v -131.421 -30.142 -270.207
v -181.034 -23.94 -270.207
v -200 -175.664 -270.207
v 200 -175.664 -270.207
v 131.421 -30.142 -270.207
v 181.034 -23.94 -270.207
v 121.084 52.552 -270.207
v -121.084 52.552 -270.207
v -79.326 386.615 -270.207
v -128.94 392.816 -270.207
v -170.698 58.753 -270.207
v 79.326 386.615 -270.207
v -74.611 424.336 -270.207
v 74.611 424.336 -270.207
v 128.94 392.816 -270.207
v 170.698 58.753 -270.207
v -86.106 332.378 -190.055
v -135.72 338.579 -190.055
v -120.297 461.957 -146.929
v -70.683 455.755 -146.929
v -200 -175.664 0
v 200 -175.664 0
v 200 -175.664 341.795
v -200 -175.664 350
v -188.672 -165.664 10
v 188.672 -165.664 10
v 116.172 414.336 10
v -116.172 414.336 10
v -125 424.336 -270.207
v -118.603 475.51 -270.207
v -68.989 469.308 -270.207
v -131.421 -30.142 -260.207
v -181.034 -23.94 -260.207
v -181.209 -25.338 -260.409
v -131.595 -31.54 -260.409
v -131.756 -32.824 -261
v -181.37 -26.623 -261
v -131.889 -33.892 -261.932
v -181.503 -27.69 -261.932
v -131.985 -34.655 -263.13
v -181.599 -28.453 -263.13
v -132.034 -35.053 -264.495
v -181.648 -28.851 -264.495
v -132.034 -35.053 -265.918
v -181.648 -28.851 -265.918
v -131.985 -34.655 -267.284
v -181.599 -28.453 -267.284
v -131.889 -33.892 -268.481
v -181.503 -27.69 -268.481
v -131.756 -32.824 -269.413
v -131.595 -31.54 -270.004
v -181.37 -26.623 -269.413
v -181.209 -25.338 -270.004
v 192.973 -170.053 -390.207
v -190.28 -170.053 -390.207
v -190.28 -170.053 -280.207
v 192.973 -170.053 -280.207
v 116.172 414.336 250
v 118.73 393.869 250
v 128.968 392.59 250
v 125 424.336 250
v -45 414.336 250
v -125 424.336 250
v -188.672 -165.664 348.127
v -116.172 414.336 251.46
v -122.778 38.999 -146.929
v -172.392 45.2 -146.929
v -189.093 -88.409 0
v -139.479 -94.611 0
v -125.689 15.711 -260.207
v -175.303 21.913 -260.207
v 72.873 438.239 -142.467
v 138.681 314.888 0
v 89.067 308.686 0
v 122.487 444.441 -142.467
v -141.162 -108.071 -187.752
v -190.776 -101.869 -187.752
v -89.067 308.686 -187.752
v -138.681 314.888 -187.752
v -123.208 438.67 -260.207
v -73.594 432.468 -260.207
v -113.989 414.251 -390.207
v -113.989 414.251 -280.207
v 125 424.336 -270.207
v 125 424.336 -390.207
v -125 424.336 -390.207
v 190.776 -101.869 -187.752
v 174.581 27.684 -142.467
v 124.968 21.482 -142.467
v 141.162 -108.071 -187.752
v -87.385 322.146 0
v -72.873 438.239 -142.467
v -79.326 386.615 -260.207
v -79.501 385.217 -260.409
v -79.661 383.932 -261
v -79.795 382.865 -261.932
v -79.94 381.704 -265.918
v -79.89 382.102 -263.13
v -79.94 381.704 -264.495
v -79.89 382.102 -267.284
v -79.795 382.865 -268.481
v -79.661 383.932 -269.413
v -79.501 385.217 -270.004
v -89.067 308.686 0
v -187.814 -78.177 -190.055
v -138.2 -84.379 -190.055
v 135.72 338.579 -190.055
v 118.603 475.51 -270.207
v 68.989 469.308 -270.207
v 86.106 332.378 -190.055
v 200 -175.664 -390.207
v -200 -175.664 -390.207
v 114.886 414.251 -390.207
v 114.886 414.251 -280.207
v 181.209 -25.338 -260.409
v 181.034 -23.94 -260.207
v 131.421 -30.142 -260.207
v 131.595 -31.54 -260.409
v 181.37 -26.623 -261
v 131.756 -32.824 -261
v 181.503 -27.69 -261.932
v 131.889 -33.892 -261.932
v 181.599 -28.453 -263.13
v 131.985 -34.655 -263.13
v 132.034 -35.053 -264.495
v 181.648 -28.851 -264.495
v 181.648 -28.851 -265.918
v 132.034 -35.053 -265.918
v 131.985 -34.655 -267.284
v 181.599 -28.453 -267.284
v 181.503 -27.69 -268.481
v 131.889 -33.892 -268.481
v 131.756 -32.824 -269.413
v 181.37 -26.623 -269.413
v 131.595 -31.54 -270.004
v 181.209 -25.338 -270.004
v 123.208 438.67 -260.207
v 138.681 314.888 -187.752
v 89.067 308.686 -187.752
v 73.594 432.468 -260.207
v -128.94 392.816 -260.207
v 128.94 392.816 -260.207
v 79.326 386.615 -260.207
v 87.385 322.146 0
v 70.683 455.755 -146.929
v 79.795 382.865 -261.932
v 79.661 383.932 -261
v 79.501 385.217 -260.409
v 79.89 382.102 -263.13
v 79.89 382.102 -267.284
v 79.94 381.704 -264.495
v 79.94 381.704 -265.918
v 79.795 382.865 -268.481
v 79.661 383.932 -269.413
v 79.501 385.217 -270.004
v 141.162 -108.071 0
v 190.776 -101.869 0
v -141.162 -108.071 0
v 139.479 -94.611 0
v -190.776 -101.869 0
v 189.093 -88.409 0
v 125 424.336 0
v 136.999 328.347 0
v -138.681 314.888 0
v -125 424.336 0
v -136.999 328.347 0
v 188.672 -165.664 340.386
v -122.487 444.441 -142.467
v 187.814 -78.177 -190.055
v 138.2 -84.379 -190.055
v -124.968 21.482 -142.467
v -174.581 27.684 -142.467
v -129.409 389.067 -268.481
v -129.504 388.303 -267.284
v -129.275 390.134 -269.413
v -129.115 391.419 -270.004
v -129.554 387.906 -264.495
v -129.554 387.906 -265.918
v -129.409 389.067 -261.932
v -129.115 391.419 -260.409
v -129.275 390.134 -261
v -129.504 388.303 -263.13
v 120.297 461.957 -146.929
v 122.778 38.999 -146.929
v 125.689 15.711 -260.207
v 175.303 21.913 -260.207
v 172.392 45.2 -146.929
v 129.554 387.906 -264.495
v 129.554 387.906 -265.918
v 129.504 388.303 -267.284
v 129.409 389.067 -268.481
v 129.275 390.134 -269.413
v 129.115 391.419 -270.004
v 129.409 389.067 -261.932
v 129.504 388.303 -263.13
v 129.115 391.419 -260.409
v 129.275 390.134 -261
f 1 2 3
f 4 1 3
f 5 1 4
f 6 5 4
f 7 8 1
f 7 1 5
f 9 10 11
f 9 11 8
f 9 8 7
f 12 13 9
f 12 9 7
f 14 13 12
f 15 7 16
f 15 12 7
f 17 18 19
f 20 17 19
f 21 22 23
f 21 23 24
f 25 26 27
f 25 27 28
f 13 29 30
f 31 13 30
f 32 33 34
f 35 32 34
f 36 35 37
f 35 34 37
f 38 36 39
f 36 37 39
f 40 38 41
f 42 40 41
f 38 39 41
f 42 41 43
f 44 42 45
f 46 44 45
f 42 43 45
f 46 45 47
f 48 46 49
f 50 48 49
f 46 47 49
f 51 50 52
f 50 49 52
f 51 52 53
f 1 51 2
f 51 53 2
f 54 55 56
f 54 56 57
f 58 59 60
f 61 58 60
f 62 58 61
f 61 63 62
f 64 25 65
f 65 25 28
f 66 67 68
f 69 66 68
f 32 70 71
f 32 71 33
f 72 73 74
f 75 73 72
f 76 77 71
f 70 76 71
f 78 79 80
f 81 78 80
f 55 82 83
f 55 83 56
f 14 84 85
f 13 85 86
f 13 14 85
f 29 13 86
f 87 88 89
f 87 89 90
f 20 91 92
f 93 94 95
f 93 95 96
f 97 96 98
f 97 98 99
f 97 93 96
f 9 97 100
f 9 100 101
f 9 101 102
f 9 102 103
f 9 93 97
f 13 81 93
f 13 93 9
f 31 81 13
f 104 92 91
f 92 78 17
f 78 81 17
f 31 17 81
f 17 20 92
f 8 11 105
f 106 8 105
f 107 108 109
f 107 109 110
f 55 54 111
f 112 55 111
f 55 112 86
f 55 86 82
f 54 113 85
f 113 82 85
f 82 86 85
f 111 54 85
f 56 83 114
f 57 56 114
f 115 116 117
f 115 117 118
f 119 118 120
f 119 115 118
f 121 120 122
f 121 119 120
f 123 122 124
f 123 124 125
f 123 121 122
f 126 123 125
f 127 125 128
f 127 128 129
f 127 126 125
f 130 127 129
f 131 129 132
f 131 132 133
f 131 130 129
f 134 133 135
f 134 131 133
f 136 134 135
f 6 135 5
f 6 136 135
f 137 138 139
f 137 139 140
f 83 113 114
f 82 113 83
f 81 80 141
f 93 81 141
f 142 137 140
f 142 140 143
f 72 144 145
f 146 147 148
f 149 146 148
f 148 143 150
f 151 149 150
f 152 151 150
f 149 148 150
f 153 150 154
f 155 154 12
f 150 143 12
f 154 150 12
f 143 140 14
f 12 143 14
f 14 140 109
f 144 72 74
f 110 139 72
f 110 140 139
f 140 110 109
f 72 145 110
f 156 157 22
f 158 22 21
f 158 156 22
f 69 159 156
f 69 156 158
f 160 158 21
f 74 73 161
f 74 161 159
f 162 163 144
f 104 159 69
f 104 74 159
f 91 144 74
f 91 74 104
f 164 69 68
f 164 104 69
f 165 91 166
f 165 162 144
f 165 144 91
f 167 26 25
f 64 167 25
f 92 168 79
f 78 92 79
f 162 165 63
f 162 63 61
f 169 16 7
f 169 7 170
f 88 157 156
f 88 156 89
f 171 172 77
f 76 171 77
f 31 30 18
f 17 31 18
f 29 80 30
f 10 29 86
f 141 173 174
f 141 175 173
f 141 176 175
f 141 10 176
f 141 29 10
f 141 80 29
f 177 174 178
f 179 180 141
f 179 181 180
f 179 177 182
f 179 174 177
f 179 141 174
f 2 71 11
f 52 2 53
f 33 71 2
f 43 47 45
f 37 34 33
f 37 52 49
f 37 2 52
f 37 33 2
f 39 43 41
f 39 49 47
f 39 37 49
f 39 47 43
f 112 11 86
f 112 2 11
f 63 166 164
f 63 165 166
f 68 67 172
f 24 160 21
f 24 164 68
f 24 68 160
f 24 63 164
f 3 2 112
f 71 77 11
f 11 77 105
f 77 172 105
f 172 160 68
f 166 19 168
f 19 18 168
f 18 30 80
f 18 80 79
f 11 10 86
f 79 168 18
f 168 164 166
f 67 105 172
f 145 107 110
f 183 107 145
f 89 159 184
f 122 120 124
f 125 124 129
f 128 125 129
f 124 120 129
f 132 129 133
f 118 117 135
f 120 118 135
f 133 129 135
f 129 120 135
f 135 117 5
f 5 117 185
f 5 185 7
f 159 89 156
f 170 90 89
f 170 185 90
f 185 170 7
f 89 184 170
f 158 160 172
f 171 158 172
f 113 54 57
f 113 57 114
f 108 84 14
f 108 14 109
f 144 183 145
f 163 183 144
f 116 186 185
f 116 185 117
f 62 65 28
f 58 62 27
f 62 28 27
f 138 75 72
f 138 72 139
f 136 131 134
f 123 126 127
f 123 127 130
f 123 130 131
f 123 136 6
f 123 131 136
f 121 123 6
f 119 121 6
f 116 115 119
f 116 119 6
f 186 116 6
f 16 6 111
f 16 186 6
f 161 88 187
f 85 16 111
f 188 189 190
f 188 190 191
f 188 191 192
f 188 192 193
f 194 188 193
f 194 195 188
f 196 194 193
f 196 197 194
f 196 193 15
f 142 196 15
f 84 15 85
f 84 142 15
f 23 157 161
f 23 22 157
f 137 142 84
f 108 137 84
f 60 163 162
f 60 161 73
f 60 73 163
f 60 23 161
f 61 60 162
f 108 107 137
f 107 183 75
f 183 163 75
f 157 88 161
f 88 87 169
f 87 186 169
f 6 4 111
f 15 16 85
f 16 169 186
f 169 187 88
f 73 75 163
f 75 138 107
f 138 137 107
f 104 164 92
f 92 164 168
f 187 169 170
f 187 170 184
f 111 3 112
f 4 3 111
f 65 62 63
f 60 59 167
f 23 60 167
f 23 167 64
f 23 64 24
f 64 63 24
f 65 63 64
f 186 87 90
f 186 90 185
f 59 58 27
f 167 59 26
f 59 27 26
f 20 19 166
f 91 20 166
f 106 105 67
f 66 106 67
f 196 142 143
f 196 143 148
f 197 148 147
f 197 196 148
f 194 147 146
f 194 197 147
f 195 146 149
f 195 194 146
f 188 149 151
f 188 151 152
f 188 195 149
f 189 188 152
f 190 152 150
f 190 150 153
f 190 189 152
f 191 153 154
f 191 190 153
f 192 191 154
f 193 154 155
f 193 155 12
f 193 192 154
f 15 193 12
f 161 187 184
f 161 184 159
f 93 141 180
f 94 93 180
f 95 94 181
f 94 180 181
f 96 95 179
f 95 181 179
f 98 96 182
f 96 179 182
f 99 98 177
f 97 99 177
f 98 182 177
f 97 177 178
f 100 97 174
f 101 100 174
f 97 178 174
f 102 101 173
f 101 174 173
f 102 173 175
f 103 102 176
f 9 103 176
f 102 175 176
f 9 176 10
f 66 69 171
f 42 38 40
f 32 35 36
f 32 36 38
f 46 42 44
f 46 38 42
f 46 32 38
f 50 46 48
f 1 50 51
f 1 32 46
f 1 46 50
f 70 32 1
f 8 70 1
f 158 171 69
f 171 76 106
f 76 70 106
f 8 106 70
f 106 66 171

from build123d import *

# Parameters (mm, degrees)
BOSS_EXTRUDE1_DEPTH = 350
SHELL1_T            = -10
CUT_EXTRUDE1_DEPTH  = 436
SKETCH3_W           = 259.761046689
SKETCH3_H           = 96.41009556
CUT_EXTRUDE2_DEPTH  = 653.147409369
BOSS_EXTRUDE2_DEPTH = 50
BOSS_EXTRUDE3_DEPTH = 120
CUT_EXTRUDE3_DEPTH  = 110


with BuildPart() as part:
    # Sketch1 → Boss-Extrude1 (new body)
    with BuildSketch(Plane.XY):
        Polygon((-125, 424.335548173), (125, 424.335548173), (200, -175.664451827), (-200, -175.664451827), align=None)
    extrude(amount=BOSS_EXTRUDE1_DEPTH)

    # Shell1
    shell1_openings = [part.faces().sort_by_distance(p)[0] for p in [
        (0, 101.258625096, 350),
    ]]
    offset(amount=SHELL1_T, openings=shell1_openings, kind=Kind.INTERSECTION)

    # Sketch2 → Cut-Extrude1 (cut)
    with BuildSketch(Plane(origin=(-175.302836698, 21.912854587, 0), x_dir=(0, 0, 1), z_dir=(-0.9922778767136677, 0.12403473458920852, 0))):
        Polygon((250, 405.554434931), (350, -199.114896191), (350, 405.554434931), align=None)
    extrude(amount=-CUT_EXTRUDE1_DEPTH, mode=Mode.SUBTRACT)

    # Sketch3 → Cut-Extrude2 (cut, through all)
    with BuildSketch(Plane(origin=(-175.302836698, 21.912854587, 0), x_dir=(0, 0, 1), z_dir=(-0.9922778767136677, 0.12403473458920852, 0))):
        with Locations((379.880523345, 453.759482711)):
            Rectangle(SKETCH3_W, SKETCH3_H)
    extrude(amount=-CUT_EXTRUDE2_DEPTH, mode=Mode.SUBTRACT)

    # Sketch5 → Boss-Extrude2 (add)
    with BuildSketch(Plane(origin=(-175.302836698, 21.912854587, 0), x_dir=(0, 0, 1), z_dir=(-0.9922778767136677, 0.12403473458920852, 0))):
        with BuildLine():
            Line((0, -124.744929756), (-142.467162168, 5.816018008))
            Line((-142.467162168, 5.816018008), (-187.751575152, -124.744929756))
            Line((-187.751575152, -124.744929756), (-260.206635925, 0))
            Line((-260.206635925, 0), (-260.206635925, -46.209963839))
            ThreePointArc((-260.206635925, -46.209963839), (-265.206635925, -51.209963839), (-270.206635925, -46.209963839))
            Line((-270.206635925, -46.209963839), (-270.206635925, 37.127182563))
            Line((-270.206635925, 37.127182563), (-190.054813406, -100.869161145))
            Line((-190.054813406, -100.869161145), (-146.928792702, 23.468856407))
            Line((-146.928792702, 23.468856407), (6.756291537, -117.372513282))
            ThreePointArc((6.756291537, -117.372513282), (7.064354006, -124.436867288), (0, -124.744929756))
        make_face()
        with BuildLine():
            Line((0, 295.255070244), (-142.467162168, 425.816018008))
            Line((-142.467162168, 425.816018008), (-187.751575152, 295.255070244))
            Line((-187.751575152, 295.255070244), (-260.206635925, 420))
            Line((-260.206635925, 420), (-260.206635925, 373.790036161))
            ThreePointArc((-260.206635925, 373.790036161), (-265.206635925, 368.790036161), (-270.206635925, 373.790036161))
            Line((-270.206635925, 373.790036161), (-270.206635925, 457.127182563))
            Line((-270.206635925, 457.127182563), (-190.054813406, 319.130838855))
            Line((-190.054813406, 319.130838855), (-146.928792702, 443.468856407))
            Line((-146.928792702, 443.468856407), (6.756291537, 302.627486718))
            ThreePointArc((6.756291537, 302.627486718), (7.064354006, 295.563132712), (0, 295.255070244))
        make_face()
    boss_extrude2 = extrude(amount=-BOSS_EXTRUDE2_DEPTH)

    # Mirror1: Boss-Extrude2 across plane
    add(boss_extrude2.mirror(Plane(origin=(0, 0, 0), x_dir=(0, 0, 1), z_dir=(1, 0, 0))))

    # Sketch6 → Boss-Extrude3 (add)
    with BuildSketch(Plane(origin=(0, 0, -270.206635925), x_dir=(-1, 0, 0), z_dir=(0, 0, -1))):
        Polygon((-200, -175.664451827), (-125, 424.335548173), (125, 424.335548173), (200, -175.664451827), align=None)
    extrude(amount=BOSS_EXTRUDE3_DEPTH)

    # Sketch7 → Cut-Extrude3 (cut)
    with BuildSketch(Plane(origin=(0, 0, -390.206635925), x_dir=(-1, 0, 0), z_dir=(0, 0, -1))):
        Polygon((-192.972753686, -170.052955611), (-114.88610452, 414.250591596), (113.988556829, 414.250591596), (190.280110611, -170.052955611), align=None)
    extrude(amount=-CUT_EXTRUDE3_DEPTH, mode=Mode.SUBTRACT)


solid = part.part
